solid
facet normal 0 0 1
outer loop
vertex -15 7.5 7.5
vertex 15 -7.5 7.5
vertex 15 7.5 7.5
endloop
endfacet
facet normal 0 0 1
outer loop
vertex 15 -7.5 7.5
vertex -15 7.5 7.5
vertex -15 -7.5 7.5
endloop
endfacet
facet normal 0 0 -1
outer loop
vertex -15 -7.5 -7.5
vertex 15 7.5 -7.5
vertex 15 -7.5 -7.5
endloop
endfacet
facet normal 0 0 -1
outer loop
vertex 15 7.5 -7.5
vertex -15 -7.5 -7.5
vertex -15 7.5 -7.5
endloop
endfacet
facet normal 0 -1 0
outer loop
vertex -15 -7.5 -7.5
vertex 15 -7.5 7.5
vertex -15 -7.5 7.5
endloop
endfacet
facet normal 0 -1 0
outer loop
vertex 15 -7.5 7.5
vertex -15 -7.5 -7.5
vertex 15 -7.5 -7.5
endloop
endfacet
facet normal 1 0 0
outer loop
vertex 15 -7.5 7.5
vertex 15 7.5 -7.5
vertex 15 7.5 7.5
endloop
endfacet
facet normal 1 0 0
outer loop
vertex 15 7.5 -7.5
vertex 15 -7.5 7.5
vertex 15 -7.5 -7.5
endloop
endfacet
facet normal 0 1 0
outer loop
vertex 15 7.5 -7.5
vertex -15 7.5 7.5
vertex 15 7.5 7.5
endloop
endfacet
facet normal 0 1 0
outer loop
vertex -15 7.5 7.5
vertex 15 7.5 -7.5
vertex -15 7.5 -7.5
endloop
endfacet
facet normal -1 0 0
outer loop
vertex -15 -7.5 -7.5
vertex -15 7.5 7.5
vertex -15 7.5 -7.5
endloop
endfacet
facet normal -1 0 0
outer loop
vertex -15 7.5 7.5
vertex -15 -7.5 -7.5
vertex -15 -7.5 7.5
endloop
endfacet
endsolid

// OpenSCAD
// Generated by generate_scads.py
cube(size=[30,15,15], center=true);
